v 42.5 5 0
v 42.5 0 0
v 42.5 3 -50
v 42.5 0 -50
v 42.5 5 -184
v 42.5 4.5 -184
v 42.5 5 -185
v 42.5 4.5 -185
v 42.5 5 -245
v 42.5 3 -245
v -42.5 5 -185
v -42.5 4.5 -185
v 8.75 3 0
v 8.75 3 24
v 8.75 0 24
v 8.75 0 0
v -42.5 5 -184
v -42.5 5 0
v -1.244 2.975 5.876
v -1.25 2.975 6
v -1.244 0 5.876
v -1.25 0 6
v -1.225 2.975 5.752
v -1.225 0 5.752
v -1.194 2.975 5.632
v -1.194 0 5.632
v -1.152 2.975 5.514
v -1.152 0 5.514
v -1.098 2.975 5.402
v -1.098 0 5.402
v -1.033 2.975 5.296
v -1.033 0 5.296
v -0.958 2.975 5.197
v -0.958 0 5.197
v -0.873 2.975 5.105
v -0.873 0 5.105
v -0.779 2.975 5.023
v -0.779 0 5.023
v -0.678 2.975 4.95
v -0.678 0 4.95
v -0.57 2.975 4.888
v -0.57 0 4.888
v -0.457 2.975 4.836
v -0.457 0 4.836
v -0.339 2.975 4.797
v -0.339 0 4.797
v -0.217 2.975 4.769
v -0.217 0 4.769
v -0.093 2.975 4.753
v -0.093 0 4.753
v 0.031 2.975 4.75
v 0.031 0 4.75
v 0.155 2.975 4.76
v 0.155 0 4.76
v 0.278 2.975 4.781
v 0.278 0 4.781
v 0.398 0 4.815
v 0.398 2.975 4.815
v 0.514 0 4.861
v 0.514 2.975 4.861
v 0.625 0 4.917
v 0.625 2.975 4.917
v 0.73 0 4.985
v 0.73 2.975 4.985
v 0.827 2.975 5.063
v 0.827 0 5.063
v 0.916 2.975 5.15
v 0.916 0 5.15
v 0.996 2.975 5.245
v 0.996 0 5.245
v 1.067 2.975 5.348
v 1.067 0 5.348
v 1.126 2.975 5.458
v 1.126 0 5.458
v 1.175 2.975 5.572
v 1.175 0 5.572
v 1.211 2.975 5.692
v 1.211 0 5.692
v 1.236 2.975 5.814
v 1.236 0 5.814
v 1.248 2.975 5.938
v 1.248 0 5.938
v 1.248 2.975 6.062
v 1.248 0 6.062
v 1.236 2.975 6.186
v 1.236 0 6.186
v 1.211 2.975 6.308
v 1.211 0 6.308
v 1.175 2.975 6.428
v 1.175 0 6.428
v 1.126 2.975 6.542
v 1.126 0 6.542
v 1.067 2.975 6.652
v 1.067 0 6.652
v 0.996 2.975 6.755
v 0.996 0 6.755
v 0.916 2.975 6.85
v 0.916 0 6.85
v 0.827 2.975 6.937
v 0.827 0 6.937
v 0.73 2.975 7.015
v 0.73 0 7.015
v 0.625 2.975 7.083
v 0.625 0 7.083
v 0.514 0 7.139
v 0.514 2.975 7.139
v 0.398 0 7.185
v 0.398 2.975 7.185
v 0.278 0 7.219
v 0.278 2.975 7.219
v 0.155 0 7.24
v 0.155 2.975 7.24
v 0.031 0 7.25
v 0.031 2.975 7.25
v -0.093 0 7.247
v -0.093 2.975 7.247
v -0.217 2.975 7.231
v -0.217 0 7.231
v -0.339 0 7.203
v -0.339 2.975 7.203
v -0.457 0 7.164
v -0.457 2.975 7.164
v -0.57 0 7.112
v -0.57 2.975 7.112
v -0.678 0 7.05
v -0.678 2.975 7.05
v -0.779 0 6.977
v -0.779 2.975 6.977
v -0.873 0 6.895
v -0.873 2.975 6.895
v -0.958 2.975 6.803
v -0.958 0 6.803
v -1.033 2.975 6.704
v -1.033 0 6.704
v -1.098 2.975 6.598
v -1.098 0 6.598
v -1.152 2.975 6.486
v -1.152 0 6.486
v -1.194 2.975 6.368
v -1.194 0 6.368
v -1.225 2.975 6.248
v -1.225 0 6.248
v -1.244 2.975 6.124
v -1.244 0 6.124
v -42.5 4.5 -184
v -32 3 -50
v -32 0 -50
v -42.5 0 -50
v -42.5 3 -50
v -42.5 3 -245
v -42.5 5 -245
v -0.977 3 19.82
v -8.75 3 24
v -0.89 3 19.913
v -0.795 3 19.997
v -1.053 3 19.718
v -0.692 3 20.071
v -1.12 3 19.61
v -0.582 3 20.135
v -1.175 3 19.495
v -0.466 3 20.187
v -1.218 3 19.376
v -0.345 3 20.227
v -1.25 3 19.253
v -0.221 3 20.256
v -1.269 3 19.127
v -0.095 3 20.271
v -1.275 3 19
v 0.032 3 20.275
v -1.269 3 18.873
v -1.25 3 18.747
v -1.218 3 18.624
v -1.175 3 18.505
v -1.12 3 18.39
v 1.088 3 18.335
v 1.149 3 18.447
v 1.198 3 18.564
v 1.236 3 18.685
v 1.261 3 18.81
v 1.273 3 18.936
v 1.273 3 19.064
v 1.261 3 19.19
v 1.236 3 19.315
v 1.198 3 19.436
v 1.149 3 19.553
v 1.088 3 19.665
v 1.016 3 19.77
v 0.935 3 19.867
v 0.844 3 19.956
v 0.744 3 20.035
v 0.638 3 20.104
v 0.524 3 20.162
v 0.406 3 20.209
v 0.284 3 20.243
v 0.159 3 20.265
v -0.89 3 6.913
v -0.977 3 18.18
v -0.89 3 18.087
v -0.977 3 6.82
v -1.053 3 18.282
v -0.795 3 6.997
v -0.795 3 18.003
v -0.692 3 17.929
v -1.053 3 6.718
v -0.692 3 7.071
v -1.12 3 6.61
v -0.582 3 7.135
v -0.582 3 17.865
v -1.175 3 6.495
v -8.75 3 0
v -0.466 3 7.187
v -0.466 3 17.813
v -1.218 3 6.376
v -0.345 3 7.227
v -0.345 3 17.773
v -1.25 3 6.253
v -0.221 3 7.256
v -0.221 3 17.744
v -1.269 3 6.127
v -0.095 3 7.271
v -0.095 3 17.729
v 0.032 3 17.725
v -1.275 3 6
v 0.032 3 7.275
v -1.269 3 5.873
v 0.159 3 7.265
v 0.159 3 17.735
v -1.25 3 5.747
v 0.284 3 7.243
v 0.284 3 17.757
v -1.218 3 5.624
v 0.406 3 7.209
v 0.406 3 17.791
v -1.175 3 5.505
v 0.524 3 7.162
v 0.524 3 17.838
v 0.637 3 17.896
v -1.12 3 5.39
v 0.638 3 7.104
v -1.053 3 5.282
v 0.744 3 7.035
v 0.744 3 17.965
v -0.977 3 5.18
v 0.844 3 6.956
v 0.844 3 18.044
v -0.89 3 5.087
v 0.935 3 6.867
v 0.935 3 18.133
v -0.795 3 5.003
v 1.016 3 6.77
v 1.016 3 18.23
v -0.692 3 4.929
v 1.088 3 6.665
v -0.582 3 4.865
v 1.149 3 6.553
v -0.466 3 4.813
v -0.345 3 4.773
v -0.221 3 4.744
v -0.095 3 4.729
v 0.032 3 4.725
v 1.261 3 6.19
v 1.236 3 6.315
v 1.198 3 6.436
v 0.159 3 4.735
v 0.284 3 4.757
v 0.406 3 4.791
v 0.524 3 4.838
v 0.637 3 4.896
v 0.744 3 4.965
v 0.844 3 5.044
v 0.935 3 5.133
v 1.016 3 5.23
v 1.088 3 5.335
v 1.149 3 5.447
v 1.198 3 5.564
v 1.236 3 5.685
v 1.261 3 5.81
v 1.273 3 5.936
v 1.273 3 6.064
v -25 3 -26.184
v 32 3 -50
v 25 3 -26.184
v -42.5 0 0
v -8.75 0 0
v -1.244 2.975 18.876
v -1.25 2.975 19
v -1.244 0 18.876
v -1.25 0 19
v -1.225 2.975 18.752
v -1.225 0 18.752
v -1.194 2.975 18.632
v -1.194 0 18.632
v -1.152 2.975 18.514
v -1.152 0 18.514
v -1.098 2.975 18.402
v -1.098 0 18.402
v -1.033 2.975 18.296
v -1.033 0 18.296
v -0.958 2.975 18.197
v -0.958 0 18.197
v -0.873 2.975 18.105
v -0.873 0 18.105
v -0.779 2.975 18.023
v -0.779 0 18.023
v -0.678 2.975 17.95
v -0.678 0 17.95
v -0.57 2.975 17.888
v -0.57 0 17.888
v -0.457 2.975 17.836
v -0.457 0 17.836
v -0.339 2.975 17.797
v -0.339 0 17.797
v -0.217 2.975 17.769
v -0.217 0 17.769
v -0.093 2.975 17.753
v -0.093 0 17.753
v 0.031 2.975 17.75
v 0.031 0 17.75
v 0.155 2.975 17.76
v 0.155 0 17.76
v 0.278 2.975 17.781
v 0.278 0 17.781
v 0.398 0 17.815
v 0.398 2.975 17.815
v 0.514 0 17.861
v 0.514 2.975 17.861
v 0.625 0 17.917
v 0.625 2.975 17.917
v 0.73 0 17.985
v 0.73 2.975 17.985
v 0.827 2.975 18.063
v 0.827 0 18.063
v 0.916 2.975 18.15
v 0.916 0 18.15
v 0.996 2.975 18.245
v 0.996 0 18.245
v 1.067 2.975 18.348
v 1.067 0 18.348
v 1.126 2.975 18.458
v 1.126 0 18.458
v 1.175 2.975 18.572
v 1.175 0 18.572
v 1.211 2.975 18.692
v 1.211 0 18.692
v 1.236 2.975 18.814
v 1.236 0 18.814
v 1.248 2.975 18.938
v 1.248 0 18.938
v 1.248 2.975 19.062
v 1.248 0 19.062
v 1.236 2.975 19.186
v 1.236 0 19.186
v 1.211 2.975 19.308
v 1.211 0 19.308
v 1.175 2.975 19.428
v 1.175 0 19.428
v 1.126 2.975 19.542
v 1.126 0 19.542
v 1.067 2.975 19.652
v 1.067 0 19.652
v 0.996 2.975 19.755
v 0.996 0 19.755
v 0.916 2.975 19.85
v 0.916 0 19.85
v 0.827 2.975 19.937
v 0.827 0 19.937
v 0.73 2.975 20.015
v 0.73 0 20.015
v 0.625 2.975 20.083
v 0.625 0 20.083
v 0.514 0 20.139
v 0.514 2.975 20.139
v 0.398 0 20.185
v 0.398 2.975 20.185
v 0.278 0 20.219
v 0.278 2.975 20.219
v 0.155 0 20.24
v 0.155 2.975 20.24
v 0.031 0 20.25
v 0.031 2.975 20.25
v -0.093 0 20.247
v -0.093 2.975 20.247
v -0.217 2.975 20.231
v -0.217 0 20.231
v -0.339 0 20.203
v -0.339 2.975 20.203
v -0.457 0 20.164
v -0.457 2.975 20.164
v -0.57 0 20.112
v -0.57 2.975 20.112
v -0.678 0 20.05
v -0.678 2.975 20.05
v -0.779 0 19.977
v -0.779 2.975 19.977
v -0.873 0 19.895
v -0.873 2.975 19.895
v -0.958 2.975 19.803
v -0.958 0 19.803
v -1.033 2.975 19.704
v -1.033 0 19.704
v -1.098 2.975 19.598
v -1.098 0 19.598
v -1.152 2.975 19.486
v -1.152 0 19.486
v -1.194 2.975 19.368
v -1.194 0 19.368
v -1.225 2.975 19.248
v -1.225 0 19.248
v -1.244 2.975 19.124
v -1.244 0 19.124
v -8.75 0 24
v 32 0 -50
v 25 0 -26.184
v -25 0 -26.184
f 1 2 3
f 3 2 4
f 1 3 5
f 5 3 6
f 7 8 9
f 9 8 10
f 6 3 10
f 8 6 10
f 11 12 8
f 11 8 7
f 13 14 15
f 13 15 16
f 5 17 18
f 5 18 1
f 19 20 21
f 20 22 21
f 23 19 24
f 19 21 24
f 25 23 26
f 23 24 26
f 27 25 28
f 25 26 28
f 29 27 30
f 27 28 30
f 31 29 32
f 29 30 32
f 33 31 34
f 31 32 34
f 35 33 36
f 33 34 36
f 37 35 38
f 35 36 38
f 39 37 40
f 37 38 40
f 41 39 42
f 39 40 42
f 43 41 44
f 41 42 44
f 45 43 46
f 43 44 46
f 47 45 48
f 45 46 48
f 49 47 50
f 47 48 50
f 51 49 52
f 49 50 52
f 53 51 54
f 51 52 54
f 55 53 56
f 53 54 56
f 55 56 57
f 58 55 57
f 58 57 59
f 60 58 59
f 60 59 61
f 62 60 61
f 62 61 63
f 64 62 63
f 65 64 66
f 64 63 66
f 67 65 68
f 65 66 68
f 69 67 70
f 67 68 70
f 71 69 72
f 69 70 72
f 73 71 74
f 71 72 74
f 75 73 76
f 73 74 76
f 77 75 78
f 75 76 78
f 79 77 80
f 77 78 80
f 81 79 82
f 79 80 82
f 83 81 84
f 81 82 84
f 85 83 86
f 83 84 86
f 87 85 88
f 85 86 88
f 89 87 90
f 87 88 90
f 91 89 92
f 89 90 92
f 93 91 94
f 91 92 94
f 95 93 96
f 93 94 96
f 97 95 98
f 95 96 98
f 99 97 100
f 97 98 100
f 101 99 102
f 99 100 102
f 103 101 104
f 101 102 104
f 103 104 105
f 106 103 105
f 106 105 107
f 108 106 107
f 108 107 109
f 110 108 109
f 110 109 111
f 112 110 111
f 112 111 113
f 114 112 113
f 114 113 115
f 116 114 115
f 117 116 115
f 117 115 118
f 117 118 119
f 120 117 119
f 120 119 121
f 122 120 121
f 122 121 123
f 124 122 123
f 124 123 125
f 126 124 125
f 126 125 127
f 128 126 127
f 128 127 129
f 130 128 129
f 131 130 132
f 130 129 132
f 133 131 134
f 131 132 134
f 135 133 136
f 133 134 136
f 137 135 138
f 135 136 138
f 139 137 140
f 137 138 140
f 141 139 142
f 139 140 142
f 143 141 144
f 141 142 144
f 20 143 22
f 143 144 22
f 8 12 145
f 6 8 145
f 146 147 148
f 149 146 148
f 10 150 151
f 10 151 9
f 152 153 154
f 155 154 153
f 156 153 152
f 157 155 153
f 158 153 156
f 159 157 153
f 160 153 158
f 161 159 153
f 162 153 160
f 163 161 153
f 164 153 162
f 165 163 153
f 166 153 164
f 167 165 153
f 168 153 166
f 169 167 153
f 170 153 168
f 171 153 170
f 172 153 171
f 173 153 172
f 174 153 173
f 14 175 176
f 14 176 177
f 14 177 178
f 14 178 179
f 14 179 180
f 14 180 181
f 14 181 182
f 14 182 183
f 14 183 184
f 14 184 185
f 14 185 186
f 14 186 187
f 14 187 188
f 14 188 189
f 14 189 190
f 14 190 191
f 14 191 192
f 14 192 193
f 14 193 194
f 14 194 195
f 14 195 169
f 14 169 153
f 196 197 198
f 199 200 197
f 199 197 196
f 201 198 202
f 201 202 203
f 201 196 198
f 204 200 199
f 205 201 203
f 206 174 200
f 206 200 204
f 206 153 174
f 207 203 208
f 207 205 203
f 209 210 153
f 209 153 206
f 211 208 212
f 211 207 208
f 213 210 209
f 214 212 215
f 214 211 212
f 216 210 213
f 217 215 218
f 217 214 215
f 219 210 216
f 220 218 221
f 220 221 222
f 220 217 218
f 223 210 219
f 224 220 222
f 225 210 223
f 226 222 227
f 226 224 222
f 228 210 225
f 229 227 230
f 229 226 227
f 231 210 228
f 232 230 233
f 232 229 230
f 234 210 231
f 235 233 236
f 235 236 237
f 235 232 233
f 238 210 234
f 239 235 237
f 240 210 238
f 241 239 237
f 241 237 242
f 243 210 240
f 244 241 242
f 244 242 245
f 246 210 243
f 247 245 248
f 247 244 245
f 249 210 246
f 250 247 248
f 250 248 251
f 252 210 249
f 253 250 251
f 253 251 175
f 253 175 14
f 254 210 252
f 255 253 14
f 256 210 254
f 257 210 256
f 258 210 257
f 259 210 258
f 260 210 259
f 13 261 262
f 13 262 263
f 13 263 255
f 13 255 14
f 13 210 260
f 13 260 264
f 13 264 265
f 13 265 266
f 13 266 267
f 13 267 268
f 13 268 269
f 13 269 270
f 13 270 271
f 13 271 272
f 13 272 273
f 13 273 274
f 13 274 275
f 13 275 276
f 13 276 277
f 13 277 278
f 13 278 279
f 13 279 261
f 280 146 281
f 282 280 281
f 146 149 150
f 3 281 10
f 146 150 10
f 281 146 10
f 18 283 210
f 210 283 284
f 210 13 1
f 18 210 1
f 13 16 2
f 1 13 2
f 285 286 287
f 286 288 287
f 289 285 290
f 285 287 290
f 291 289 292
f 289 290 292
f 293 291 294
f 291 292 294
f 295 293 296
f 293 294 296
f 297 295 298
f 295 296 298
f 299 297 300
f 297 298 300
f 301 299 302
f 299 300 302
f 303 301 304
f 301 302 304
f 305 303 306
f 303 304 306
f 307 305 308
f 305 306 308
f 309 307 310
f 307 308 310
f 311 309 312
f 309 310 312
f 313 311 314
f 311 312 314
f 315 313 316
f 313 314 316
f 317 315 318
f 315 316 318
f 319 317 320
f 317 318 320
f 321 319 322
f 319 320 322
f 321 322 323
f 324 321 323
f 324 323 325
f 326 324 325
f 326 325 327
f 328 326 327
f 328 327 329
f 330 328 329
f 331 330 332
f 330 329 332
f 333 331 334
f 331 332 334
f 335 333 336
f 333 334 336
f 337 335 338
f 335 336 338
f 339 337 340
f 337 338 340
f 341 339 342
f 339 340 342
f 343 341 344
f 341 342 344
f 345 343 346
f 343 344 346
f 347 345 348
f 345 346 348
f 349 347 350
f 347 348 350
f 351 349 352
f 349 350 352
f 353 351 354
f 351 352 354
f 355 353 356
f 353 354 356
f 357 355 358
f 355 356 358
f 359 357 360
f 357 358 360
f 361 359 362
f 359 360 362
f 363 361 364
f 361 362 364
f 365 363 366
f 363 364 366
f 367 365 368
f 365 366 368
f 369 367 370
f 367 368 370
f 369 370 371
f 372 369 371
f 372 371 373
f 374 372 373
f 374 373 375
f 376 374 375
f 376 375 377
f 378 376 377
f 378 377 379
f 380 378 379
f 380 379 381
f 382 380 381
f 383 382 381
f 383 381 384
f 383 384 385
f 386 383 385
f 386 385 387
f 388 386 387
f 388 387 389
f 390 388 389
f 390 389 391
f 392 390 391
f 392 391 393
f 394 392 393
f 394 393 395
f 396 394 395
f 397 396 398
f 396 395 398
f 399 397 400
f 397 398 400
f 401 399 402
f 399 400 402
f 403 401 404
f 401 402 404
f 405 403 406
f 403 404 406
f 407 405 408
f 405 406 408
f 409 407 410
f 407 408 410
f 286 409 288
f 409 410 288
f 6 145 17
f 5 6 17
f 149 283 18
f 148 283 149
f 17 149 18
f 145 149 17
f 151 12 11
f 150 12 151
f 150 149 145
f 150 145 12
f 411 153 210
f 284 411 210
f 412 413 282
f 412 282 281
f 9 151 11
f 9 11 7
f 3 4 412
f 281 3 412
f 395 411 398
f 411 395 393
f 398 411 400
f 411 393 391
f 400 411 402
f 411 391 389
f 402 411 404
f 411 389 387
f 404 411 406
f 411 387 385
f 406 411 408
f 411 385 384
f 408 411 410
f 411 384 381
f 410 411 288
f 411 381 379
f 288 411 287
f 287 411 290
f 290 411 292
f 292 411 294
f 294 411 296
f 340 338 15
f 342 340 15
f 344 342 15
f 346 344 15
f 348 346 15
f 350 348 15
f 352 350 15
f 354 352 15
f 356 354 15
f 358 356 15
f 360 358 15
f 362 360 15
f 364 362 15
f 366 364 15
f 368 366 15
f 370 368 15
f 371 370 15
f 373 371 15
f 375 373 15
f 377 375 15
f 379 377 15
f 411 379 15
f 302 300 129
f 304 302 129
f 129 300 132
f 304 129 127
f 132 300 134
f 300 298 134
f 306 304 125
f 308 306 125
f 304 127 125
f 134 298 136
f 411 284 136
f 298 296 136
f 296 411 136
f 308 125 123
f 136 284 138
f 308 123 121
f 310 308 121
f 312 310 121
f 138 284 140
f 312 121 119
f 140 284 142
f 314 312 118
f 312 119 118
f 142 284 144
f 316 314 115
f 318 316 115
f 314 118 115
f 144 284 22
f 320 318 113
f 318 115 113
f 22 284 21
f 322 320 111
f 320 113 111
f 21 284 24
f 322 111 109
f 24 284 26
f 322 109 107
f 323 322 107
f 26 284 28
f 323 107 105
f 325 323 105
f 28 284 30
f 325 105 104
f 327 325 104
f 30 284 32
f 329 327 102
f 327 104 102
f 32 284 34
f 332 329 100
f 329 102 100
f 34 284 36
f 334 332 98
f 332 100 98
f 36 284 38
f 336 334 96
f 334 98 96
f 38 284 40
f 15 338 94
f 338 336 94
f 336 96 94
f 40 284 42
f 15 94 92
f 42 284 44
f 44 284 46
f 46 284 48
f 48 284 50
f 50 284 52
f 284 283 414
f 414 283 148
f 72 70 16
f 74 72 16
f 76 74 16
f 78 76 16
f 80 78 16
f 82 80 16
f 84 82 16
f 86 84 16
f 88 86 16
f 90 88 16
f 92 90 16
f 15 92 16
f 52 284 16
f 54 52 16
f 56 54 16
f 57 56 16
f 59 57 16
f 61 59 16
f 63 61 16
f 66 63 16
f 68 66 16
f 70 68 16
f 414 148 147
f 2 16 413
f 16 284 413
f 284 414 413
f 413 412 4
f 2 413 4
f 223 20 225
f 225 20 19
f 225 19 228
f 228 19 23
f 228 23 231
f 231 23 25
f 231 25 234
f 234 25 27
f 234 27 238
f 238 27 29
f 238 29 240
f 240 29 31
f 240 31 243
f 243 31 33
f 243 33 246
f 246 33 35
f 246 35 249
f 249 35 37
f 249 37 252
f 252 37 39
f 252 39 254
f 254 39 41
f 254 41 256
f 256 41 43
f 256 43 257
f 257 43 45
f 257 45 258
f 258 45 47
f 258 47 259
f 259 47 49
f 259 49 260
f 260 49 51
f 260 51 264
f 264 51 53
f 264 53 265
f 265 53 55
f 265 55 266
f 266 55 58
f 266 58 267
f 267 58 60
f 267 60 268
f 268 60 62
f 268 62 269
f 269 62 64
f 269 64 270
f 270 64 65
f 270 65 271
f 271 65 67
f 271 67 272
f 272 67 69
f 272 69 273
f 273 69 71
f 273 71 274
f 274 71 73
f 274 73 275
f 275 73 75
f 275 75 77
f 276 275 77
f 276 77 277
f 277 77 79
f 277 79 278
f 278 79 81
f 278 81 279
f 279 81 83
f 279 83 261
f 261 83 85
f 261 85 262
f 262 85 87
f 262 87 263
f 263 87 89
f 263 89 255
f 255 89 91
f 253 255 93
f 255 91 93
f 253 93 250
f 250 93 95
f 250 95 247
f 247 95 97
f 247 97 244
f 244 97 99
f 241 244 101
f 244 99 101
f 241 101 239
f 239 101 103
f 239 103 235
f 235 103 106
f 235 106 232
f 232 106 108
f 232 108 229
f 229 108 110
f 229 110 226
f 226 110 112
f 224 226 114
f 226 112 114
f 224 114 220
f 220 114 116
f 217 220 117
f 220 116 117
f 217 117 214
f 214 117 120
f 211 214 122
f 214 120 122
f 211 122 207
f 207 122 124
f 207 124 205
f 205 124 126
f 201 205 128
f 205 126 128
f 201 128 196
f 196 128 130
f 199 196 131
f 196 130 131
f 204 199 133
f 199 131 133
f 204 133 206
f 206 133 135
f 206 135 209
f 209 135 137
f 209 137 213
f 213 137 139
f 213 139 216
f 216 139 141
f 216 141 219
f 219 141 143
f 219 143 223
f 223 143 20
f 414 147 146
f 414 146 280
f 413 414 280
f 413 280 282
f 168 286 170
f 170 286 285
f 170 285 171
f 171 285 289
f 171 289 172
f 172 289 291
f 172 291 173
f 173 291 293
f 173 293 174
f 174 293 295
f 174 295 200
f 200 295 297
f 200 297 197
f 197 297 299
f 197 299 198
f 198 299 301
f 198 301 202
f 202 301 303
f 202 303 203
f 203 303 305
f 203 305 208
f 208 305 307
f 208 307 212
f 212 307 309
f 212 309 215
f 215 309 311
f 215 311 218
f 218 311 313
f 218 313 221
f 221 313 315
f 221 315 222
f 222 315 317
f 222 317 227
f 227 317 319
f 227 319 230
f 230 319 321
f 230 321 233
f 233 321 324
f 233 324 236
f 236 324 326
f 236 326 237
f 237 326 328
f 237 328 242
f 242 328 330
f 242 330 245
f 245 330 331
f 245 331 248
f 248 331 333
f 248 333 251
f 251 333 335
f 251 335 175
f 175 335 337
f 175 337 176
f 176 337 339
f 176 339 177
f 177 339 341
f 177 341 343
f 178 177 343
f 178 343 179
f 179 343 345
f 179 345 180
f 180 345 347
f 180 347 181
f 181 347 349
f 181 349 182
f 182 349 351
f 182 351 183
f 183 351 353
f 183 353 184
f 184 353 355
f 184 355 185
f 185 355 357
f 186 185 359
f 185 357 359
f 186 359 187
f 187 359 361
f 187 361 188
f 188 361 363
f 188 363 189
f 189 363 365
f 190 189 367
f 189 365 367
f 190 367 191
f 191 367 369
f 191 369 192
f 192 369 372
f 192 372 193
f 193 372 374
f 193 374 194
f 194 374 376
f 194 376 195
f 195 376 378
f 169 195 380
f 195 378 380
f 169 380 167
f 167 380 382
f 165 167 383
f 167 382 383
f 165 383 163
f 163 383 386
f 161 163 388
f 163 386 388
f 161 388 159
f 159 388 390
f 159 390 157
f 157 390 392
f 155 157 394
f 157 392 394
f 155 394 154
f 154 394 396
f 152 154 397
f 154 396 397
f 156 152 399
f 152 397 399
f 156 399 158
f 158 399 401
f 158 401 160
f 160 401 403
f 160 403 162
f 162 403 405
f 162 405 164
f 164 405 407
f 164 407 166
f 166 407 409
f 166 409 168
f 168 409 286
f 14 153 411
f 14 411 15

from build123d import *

# Parameters (mm, degrees)
BOSS_EXTRUDE1_DEPTH                  = 3
SKETCH10_W                           = 17.5
SKETCH10_H                           = 24
BOSS_EXTRUDE2_DEPTH                  = 3
F_2_5_2_5_DIAMETER_HOLE1_D           = 2.5
F_2_5_2_5_DIAMETER_HOLE1_DEPTH       = 6.35
F_2_5_2_5_DIAMETER_HOLE1_CSINK_D     = 2.55
F_2_5_2_5_DIAMETER_HOLE1_CSINK_ANGLE = 90
F_2_5_2_5_DIAMETER_HOLE1_TIP         = 0.751075774
CUT_EXTRUDE3_DEPTH                   = 4
SKETCH11_W                           = 85
SKETCH11_H                           = 245
BOSS_EXTRUDE3_DEPTH                  = 2
SKETCH12_W                           = 1
SKETCH12_H                           = 0.5
CUT_EXTRUDE4_DEPTH                   = 1
CUT_EXTRUDE4_DEPTH_BACK              = 86


with BuildPart() as part:
    # Sketch2 → Boss-Extrude1 (new body)
    with BuildSketch(Plane(origin=(0, 0, 0), x_dir=(1, 0, 0), z_dir=(0, 1, 0))):
        Polygon((42.5, 0), (42.5, 50), (22.5, 50), (8.75, 26.184301396), (-8.75, 26.184301396), (-22.5, 50), (-42.5, 50), (-42.5, 0), align=None)
    extrude(amount=BOSS_EXTRUDE1_DEPTH)

    # Sketch10 → Boss-Extrude2 (add)
    with BuildSketch(Plane(origin=(0, 3, 0), x_dir=(1, 0, 0), z_dir=(0, 1, 0))):
        with Locations((0, -12)):
            Rectangle(SKETCH10_W, SKETCH10_H)
    extrude(amount=-BOSS_EXTRUDE2_DEPTH)

    # Ø2.5 (2.5) Diameter Hole1
    with Locations(Plane(origin=(0, 3, 0), x_dir=(1, 0, 0), z_dir=(0, 1, 0))):
        with Locations((0, -19), (0, -6)):
            CounterSinkHole(F_2_5_2_5_DIAMETER_HOLE1_D / 2, F_2_5_2_5_DIAMETER_HOLE1_CSINK_D / 2, depth=F_2_5_2_5_DIAMETER_HOLE1_DEPTH, counter_sink_angle=F_2_5_2_5_DIAMETER_HOLE1_CSINK_ANGLE)
            with Locations((0, 0, -(F_2_5_2_5_DIAMETER_HOLE1_DEPTH + F_2_5_2_5_DIAMETER_HOLE1_TIP / 2))):  # 118° drill point
                Cone(0, F_2_5_2_5_DIAMETER_HOLE1_D / 2, F_2_5_2_5_DIAMETER_HOLE1_TIP, mode=Mode.SUBTRACT)

    # Sketch9 → Cut-Extrude3 (cut, through all)
    with BuildSketch(Plane.XZ):
        Polygon((-32, -50), (-25, -26.184301396), (25, -26.184301396), (32, -50), align=None)
    extrude(amount=-CUT_EXTRUDE3_DEPTH, mode=Mode.SUBTRACT)

    # Sketch11 → Boss-Extrude3 (add)
    with BuildSketch(Plane(origin=(0, 3, 0), x_dir=(1, 0, 0), z_dir=(0, 1, 0))):
        with Locations((0, 122.5)):
            Rectangle(SKETCH11_W, SKETCH11_H)
    extrude(amount=BOSS_EXTRUDE3_DEPTH)

    # Sketch12 → Cut-Extrude4 (cut, two sides)
    with BuildSketch(Plane.ZY.offset(42.5)) as cut_extrude4_sk:
        with Locations((-184.5, 4.75)):
            Rectangle(SKETCH12_W, SKETCH12_H)
    extrude(amount=CUT_EXTRUDE4_DEPTH, mode=Mode.SUBTRACT)
    extrude(cut_extrude4_sk.sketch, amount=-CUT_EXTRUDE4_DEPTH_BACK, mode=Mode.SUBTRACT)


solid = part.part
